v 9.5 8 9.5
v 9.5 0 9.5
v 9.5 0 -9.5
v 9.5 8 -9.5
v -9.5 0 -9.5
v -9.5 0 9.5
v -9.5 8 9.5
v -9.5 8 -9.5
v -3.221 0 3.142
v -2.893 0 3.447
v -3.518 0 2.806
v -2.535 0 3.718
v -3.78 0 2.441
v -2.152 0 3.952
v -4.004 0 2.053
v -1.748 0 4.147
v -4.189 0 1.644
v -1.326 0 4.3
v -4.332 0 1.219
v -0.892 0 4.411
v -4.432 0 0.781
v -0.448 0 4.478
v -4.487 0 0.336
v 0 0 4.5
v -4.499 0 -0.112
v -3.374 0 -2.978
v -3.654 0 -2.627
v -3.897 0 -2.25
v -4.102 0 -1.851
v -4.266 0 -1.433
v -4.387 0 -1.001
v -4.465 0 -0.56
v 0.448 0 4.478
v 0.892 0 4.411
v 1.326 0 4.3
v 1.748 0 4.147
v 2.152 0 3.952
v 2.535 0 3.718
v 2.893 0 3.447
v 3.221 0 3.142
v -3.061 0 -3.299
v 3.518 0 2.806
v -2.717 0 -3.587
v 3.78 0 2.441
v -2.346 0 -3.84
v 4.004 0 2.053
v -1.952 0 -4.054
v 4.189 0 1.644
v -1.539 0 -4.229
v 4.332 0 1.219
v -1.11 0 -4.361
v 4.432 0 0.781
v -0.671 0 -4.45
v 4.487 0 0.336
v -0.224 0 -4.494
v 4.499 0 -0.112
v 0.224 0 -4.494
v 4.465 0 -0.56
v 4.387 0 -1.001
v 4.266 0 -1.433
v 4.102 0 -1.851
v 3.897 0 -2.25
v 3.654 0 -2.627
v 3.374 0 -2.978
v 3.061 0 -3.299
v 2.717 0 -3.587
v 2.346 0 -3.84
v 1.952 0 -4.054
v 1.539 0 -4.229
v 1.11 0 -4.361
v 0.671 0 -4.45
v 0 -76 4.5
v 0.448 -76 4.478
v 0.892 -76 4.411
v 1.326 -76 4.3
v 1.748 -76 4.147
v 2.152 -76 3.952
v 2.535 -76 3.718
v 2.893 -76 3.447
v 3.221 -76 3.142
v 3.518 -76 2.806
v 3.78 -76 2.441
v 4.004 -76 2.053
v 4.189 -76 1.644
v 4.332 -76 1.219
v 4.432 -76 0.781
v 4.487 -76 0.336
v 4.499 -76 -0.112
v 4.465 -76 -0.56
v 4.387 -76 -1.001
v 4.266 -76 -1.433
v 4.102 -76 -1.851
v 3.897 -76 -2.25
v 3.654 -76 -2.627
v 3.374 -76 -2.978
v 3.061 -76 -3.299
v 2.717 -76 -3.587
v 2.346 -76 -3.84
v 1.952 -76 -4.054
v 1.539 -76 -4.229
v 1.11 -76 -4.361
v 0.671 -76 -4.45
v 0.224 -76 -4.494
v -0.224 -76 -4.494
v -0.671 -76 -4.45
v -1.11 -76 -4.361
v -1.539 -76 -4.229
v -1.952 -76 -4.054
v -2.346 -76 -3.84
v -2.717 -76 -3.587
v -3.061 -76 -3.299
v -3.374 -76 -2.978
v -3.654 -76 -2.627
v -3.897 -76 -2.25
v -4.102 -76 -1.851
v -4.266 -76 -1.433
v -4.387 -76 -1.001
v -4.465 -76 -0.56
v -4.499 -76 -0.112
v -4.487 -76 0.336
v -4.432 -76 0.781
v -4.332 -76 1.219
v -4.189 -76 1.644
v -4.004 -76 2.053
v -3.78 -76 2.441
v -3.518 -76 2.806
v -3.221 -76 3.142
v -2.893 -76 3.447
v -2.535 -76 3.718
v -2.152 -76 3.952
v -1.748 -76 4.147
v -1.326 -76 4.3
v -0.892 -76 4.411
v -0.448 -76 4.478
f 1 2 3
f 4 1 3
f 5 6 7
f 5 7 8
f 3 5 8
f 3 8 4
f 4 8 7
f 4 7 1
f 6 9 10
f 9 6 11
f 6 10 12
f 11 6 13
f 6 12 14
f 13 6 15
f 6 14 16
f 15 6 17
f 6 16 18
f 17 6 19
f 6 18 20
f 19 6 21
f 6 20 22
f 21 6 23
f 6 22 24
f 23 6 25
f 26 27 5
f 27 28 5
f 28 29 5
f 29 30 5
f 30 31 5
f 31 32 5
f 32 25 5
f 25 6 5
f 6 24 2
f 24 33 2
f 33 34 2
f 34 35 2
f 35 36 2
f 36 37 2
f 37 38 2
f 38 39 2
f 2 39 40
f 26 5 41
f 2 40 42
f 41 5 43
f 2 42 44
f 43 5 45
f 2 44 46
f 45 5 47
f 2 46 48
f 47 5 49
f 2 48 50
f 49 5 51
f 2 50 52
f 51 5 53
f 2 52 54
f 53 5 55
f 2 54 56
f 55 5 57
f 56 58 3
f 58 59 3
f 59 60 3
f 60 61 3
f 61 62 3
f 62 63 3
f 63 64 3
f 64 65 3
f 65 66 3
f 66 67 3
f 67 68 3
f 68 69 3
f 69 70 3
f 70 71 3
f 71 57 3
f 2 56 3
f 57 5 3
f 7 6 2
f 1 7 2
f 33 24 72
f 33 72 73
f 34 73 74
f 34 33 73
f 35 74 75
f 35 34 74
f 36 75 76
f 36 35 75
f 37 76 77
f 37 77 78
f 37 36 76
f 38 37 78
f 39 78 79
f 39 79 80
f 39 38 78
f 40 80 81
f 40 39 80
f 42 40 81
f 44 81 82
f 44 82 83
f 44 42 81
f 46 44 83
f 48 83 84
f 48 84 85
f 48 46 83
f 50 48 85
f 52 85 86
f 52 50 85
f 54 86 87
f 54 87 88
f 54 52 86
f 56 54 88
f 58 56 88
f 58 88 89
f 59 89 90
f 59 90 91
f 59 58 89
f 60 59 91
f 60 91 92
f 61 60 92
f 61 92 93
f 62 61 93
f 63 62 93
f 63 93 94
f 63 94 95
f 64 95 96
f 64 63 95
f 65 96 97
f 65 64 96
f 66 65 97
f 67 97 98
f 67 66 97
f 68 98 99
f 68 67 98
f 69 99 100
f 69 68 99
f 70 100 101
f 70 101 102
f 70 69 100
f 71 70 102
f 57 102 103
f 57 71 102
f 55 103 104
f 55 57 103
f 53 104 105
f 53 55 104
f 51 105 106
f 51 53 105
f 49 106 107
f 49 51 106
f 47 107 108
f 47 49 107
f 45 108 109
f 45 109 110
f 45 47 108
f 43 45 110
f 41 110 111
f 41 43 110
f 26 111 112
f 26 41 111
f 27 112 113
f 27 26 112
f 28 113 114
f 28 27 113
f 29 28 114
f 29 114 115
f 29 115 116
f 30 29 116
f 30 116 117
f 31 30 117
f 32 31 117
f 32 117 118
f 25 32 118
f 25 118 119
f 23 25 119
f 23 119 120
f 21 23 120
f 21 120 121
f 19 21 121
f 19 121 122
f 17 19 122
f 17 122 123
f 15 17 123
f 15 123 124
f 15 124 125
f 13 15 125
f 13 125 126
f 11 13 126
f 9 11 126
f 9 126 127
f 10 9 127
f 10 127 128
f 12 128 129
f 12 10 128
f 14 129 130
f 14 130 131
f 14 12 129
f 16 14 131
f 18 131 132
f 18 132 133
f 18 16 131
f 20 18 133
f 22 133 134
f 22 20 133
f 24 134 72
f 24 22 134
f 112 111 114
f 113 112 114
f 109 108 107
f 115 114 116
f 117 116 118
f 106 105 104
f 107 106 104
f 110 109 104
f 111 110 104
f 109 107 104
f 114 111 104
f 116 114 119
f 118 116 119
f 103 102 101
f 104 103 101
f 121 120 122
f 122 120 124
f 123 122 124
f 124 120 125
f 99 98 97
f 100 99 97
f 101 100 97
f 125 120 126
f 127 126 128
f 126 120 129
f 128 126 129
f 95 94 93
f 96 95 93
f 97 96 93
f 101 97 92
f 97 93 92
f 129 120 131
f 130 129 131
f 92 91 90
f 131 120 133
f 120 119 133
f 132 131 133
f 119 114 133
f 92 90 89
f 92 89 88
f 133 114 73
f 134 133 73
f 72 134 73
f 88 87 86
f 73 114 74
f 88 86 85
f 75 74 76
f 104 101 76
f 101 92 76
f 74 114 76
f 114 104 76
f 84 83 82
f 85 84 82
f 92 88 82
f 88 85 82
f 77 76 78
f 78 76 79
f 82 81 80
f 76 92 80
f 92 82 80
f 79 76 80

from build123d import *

# Parameters (mm, degrees)
SKETCH3_W           = 19
SKETCH3_H           = 19
BOSS_EXTRUDE1_DEPTH = 8
SKETCH4_R           = 4.5
BOSS_EXTRUDE2_DEPTH = 76


with BuildPart() as part:
    # Sketch3 → Boss-Extrude1 (new body)
    with BuildSketch(Plane(origin=(0, 0, 0), x_dir=(1, 0, 0), z_dir=(0, 1, 0))):
        Rectangle(SKETCH3_W, SKETCH3_H)
    extrude(amount=BOSS_EXTRUDE1_DEPTH)

    # Sketch4 → Boss-Extrude2 (add)
    with BuildSketch(Plane(origin=(0, 0, 0), x_dir=(1, 0, 0), z_dir=(0, 1, 0))):
        with Locations(Location((0, 0, 0), (0, 0, 270))):  # turned: the seam where the file's is
            Circle(SKETCH4_R)
    extrude(amount=-BOSS_EXTRUDE2_DEPTH)


solid = part.part
